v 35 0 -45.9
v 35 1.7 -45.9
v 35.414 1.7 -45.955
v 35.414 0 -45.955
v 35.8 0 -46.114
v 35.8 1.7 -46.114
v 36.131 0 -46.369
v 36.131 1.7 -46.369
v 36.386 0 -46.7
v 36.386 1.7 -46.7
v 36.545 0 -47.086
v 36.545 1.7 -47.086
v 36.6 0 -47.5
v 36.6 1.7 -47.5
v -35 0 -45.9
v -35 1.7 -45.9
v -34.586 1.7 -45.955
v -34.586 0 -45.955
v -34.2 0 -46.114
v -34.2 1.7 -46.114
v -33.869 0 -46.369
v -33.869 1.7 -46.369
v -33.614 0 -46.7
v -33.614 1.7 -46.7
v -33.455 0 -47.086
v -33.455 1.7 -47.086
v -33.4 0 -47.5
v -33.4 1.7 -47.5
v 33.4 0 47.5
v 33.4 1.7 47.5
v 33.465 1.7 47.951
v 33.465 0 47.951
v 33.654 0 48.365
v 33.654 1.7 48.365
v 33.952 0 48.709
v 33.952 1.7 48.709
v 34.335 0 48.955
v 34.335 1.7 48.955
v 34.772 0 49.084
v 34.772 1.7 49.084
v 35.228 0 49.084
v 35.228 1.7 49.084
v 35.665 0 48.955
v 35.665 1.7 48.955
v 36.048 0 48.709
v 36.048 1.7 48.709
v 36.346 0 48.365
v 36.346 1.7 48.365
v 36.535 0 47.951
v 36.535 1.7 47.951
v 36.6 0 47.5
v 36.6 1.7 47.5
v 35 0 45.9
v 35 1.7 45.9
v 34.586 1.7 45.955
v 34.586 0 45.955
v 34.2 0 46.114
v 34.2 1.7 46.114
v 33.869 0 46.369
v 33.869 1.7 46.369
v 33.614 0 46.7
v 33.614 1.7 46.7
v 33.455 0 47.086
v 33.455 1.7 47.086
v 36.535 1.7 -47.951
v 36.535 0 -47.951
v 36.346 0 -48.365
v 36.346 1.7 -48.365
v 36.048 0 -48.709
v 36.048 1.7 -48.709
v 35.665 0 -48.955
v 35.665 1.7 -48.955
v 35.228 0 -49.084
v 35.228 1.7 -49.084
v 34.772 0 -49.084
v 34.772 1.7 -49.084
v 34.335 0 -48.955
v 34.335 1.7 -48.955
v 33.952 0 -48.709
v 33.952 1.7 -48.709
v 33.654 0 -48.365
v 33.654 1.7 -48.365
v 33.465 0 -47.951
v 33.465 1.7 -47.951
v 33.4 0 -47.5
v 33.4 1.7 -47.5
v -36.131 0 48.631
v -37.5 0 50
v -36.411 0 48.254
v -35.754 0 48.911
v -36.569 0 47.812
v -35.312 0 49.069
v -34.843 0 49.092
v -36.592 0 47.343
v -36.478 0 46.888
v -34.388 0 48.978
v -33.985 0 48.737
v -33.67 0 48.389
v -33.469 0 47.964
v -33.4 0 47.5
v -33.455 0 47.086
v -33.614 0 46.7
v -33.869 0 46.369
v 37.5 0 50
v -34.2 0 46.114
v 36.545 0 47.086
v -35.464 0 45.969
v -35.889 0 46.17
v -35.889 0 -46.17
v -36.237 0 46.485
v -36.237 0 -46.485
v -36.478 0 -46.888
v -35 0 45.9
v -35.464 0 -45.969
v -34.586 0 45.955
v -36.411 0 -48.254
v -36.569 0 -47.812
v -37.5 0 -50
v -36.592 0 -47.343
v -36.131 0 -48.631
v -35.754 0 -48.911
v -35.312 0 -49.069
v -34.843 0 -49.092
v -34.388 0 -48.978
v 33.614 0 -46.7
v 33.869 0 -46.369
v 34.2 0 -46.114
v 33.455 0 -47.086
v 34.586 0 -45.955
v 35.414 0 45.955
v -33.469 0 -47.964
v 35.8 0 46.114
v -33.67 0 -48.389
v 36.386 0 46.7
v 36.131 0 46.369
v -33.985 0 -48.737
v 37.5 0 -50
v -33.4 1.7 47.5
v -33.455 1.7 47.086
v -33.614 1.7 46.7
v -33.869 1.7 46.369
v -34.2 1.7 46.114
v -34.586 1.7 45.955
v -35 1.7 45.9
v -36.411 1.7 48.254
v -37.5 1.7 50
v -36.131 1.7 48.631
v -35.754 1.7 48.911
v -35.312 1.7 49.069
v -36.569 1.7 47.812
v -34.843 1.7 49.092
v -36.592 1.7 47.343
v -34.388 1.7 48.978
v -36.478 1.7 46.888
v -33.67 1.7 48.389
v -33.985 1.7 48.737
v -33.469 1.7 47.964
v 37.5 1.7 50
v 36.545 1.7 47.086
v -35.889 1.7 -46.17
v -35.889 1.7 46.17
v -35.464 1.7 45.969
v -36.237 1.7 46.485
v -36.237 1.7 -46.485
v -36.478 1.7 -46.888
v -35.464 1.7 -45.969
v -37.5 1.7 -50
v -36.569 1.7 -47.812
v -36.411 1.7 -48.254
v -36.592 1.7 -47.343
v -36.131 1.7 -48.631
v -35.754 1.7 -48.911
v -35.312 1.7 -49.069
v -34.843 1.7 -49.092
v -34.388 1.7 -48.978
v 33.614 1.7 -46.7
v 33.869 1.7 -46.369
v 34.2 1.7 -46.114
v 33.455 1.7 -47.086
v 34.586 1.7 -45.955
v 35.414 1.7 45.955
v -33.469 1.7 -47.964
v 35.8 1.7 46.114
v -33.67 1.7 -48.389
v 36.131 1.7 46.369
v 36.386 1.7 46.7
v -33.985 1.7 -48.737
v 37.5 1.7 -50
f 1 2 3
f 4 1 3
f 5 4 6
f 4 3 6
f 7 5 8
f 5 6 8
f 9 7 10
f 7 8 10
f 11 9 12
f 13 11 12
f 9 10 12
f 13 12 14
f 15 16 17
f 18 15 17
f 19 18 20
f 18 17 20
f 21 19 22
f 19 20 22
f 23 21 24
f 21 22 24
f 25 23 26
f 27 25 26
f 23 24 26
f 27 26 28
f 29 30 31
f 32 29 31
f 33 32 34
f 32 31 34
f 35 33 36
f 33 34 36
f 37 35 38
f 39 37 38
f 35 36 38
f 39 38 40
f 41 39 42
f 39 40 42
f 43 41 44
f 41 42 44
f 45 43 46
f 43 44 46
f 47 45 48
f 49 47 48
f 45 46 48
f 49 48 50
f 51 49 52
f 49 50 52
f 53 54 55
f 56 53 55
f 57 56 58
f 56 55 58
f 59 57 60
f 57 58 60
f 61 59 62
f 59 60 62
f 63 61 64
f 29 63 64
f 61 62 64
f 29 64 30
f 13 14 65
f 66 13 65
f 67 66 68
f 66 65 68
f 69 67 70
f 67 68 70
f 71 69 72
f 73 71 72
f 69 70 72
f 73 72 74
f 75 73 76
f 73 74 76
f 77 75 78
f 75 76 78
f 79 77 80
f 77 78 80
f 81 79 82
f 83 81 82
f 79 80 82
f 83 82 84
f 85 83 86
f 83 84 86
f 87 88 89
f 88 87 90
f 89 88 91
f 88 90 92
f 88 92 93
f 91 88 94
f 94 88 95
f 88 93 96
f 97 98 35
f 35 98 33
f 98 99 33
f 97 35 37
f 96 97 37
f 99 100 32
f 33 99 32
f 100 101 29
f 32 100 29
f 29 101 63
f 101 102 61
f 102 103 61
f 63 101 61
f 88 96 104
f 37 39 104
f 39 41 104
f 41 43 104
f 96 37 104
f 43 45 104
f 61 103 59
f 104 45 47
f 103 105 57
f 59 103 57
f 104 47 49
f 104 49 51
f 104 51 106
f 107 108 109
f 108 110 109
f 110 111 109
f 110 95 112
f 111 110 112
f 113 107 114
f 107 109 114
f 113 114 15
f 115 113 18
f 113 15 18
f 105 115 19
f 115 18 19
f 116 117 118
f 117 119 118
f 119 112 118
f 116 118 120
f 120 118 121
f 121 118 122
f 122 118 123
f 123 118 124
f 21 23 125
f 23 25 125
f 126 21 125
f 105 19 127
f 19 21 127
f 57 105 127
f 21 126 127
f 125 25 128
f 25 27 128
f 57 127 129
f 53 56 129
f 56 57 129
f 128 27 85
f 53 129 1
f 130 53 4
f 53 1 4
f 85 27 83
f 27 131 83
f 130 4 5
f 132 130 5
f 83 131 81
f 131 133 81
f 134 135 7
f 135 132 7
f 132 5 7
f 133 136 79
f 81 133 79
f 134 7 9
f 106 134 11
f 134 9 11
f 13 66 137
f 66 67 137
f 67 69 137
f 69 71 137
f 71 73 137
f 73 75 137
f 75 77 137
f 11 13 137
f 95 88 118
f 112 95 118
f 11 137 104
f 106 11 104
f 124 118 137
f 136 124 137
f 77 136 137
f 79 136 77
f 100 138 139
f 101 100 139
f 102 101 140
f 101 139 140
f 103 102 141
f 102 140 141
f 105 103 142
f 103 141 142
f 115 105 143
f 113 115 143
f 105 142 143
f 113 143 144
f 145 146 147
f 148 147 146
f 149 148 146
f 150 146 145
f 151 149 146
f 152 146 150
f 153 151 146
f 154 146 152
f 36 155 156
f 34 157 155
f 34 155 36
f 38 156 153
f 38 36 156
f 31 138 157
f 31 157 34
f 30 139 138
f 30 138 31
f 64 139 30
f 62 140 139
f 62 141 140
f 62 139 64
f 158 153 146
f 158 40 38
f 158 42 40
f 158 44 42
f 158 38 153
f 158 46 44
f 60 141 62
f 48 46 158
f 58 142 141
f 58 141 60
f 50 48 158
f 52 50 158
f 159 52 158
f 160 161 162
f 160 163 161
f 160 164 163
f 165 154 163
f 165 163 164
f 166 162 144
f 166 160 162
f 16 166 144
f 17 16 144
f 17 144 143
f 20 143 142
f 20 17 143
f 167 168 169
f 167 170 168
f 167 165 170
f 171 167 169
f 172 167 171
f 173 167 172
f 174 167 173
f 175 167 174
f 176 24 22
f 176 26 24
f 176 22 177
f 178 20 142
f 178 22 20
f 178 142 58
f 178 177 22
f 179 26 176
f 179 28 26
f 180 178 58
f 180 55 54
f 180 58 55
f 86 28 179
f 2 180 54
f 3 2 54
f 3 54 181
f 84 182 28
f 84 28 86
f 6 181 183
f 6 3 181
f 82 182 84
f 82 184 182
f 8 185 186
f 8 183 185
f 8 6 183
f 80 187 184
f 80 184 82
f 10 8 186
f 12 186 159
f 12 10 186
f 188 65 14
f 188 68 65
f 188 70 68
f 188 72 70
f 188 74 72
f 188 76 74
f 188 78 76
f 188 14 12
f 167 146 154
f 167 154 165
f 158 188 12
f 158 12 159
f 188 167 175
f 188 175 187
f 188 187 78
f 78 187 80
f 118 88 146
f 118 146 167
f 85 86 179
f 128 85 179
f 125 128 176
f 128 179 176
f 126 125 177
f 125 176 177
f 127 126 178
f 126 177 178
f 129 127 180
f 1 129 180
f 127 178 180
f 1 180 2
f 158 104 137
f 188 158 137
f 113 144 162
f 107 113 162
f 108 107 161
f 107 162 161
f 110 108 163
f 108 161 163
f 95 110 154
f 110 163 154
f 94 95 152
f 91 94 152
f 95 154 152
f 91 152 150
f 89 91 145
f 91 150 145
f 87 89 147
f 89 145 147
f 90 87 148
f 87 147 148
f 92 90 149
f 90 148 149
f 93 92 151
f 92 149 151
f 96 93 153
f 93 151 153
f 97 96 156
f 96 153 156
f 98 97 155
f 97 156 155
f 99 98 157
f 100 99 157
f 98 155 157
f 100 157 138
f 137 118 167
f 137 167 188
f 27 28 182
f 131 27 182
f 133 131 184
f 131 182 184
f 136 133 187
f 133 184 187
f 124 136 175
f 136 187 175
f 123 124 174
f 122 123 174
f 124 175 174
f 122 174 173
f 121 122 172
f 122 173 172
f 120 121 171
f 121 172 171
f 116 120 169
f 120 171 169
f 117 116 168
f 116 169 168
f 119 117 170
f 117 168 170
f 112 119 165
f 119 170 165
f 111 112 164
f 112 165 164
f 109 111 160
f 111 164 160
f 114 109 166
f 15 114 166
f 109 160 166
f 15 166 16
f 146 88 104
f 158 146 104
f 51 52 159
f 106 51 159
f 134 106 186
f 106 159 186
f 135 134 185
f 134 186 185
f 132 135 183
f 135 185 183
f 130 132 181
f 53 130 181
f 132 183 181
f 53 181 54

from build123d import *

# Parameters (mm, degrees)
SKETCH1_W           = 75
SKETCH1_H           = 100
BOSS_EXTRUDE1_DEPTH = 1.7
CUT_EXTRUDE1_REACH  = 64.523


with BuildPart() as part:
    # Sketch1 → Boss-Extrude1 (new body)
    with BuildSketch(Plane(origin=(0, 0, 0), x_dir=(1, 0, 0), z_dir=(0, 1, 0))):
        Rectangle(SKETCH1_W, SKETCH1_H)
    extrude(amount=BOSS_EXTRUDE1_DEPTH)

    # Sketch2 → Cut-Extrude1 (cut, up to next)
    with BuildSketch(Plane(origin=(0, 1.7, 0), x_dir=(1, 0, 0), z_dir=(0, 1, 0)), mode=Mode.PRIVATE) as cut_extrude1_sk1:
        with BuildLine():
            ThreePointArc((-33.4, 47.5), (-36.13137085, 48.63137085), (-35, 45.9))
            Line((-35, 45.9), (-35, 47.5))
            Line((-35, 47.5), (-33.4, 47.5))
        make_face()
    cut_extrude1_tool1 = extrude(cut_extrude1_sk1.sketch, amount=-CUT_EXTRUDE1_REACH, mode=Mode.PRIVATE) & part.part
    # Sketch2 → Cut-Extrude1 (cut, up to next)
    with BuildSketch(Plane(origin=(0, 1.7, 0), x_dir=(1, 0, 0), z_dir=(0, 1, 0)), mode=Mode.PRIVATE) as cut_extrude1_sk2:
        with BuildLine():
            Line((-35, 47.5), (-35, 45.9))
            ThreePointArc((-35, 45.9), (-33.86862915, 46.36862915), (-33.4, 47.5))
            Line((-33.4, 47.5), (-35, 47.5))
        make_face()
    cut_extrude1_tool2 = extrude(cut_extrude1_sk2.sketch, amount=-CUT_EXTRUDE1_REACH, mode=Mode.PRIVATE) & part.part
    # Sketch2 → Cut-Extrude1 (cut, up to next)
    with BuildSketch(Plane(origin=(0, 1.7, 0), x_dir=(1, 0, 0), z_dir=(0, 1, 0)), mode=Mode.PRIVATE) as cut_extrude1_sk3:
        with BuildLine():
            ThreePointArc((-33.4, 47.5), (-36.13137085, 48.63137085), (-35, 45.9))
            Line((-35, 45.9), (-35, 47.5))
            Line((-35, 47.5), (-33.4, 47.5))
        make_face()
    cut_extrude1_tool3 = extrude(cut_extrude1_sk3.sketch, amount=-CUT_EXTRUDE1_REACH, mode=Mode.PRIVATE) & part.part
    # Sketch2 → Cut-Extrude1 (cut, up to next)
    with BuildSketch(Plane(origin=(0, 1.7, 0), x_dir=(1, 0, 0), z_dir=(0, 1, 0)), mode=Mode.PRIVATE) as cut_extrude1_sk4:
        with BuildLine():
            Line((-35, 47.5), (-35, 45.9))
            ThreePointArc((-35, 45.9), (-33.86862915, 46.36862915), (-33.4, 47.5))
            Line((-33.4, 47.5), (-35, 47.5))
        make_face()
    cut_extrude1_tool4 = extrude(cut_extrude1_sk4.sketch, amount=-CUT_EXTRUDE1_REACH, mode=Mode.PRIVATE) & part.part
    # Sketch2 → Cut-Extrude1 (cut, up to next)
    with BuildSketch(Plane(origin=(0, 1.7, 0), x_dir=(1, 0, 0), z_dir=(0, 1, 0)), mode=Mode.PRIVATE) as cut_extrude1_sk5:
        with BuildLine():
            ThreePointArc((33.4, 47.5), (33.86862915, 46.36862915), (35, 45.9))
            Line((35, 45.9), (35, 47.5))
            Line((35, 47.5), (33.4, 47.5))
        make_face()
    cut_extrude1_tool5 = extrude(cut_extrude1_sk5.sketch, amount=-CUT_EXTRUDE1_REACH, mode=Mode.PRIVATE) & part.part
    # Sketch2 → Cut-Extrude1 (cut, up to next)
    with BuildSketch(Plane(origin=(0, 1.7, 0), x_dir=(1, 0, 0), z_dir=(0, 1, 0)), mode=Mode.PRIVATE) as cut_extrude1_sk6:
        with BuildLine():
            Line((35, 47.5), (35, 45.9))
            ThreePointArc((35, 45.9), (36.13137085, 46.36862915), (36.6, 47.5))
            ThreePointArc((36.6, 47.5), (35, 49.1), (33.4, 47.5))
            Line((33.4, 47.5), (35, 47.5))
        make_face()
    cut_extrude1_tool6 = extrude(cut_extrude1_sk6.sketch, amount=-CUT_EXTRUDE1_REACH, mode=Mode.PRIVATE) & part.part
    # Sketch2 → Cut-Extrude1 (cut, up to next)
    with BuildSketch(Plane(origin=(0, 1.7, 0), x_dir=(1, 0, 0), z_dir=(0, 1, 0)), mode=Mode.PRIVATE) as cut_extrude1_sk7:
        with BuildLine():
            ThreePointArc((33.4, 47.5), (33.86862915, 46.36862915), (35, 45.9))
            Line((35, 45.9), (35, 47.5))
            Line((35, 47.5), (33.4, 47.5))
        make_face()
    cut_extrude1_tool7 = extrude(cut_extrude1_sk7.sketch, amount=-CUT_EXTRUDE1_REACH, mode=Mode.PRIVATE) & part.part
    # Sketch2 → Cut-Extrude1 (cut, up to next)
    with BuildSketch(Plane(origin=(0, 1.7, 0), x_dir=(1, 0, 0), z_dir=(0, 1, 0)), mode=Mode.PRIVATE) as cut_extrude1_sk8:
        with BuildLine():
            Line((35, 47.5), (35, 45.9))
            ThreePointArc((35, 45.9), (36.13137085, 46.36862915), (36.6, 47.5))
            ThreePointArc((36.6, 47.5), (35, 49.1), (33.4, 47.5))
            Line((33.4, 47.5), (35, 47.5))
        make_face()
    cut_extrude1_tool8 = extrude(cut_extrude1_sk8.sketch, amount=-CUT_EXTRUDE1_REACH, mode=Mode.PRIVATE) & part.part
    # Sketch2 → Cut-Extrude1 (cut, up to next)
    with BuildSketch(Plane(origin=(0, 1.7, 0), x_dir=(1, 0, 0), z_dir=(0, 1, 0)), mode=Mode.PRIVATE) as cut_extrude1_sk9:
        with BuildLine():
            Line((-35, -45.9), (-35, -47.5))
            Line((-35, -47.5), (-33.4, -47.5))
            ThreePointArc((-33.4, -47.5), (-33.86862915, -46.36862915), (-35, -45.9))
        make_face()
    cut_extrude1_tool9 = extrude(cut_extrude1_sk9.sketch, amount=-CUT_EXTRUDE1_REACH, mode=Mode.PRIVATE) & part.part
    # Sketch2 → Cut-Extrude1 (cut, up to next)
    with BuildSketch(Plane(origin=(0, 1.7, 0), x_dir=(1, 0, 0), z_dir=(0, 1, 0)), mode=Mode.PRIVATE) as cut_extrude1_sk10:
        with BuildLine():
            Line((-33.4, -47.5), (-35, -47.5))
            Line((-35, -47.5), (-35, -45.9))
            ThreePointArc((-35, -45.9), (-36.13137085, -48.63137085), (-33.4, -47.5))
        make_face()
    cut_extrude1_tool10 = extrude(cut_extrude1_sk10.sketch, amount=-CUT_EXTRUDE1_REACH, mode=Mode.PRIVATE) & part.part
    # Sketch2 → Cut-Extrude1 (cut, up to next)
    with BuildSketch(Plane(origin=(0, 1.7, 0), x_dir=(1, 0, 0), z_dir=(0, 1, 0)), mode=Mode.PRIVATE) as cut_extrude1_sk11:
        with BuildLine():
            Line((-35, -45.9), (-35, -47.5))
            Line((-35, -47.5), (-33.4, -47.5))
            ThreePointArc((-33.4, -47.5), (-33.86862915, -46.36862915), (-35, -45.9))
        make_face()
    cut_extrude1_tool11 = extrude(cut_extrude1_sk11.sketch, amount=-CUT_EXTRUDE1_REACH, mode=Mode.PRIVATE) & part.part
    # Sketch2 → Cut-Extrude1 (cut, up to next)
    with BuildSketch(Plane(origin=(0, 1.7, 0), x_dir=(1, 0, 0), z_dir=(0, 1, 0)), mode=Mode.PRIVATE) as cut_extrude1_sk12:
        with BuildLine():
            Line((-33.4, -47.5), (-35, -47.5))
            Line((-35, -47.5), (-35, -45.9))
            ThreePointArc((-35, -45.9), (-36.13137085, -48.63137085), (-33.4, -47.5))
        make_face()
    cut_extrude1_tool12 = extrude(cut_extrude1_sk12.sketch, amount=-CUT_EXTRUDE1_REACH, mode=Mode.PRIVATE) & part.part
    # Sketch2 → Cut-Extrude1 (cut, up to next)
    with BuildSketch(Plane(origin=(0, 1.7, 0), x_dir=(1, 0, 0), z_dir=(0, 1, 0)), mode=Mode.PRIVATE) as cut_extrude1_sk13:
        with BuildLine():
            ThreePointArc((35, -45.9), (33.86862915, -46.36862915), (33.4, -47.5))
            Line((33.4, -47.5), (35, -47.5))
            Line((35, -47.5), (35, -45.9))
        make_face()
    cut_extrude1_tool13 = extrude(cut_extrude1_sk13.sketch, amount=-CUT_EXTRUDE1_REACH, mode=Mode.PRIVATE) & part.part
    # Sketch2 → Cut-Extrude1 (cut, up to next)
    with BuildSketch(Plane(origin=(0, 1.7, 0), x_dir=(1, 0, 0), z_dir=(0, 1, 0)), mode=Mode.PRIVATE) as cut_extrude1_sk14:
        with BuildLine():
            Line((35, -47.5), (33.4, -47.5))
            ThreePointArc((33.4, -47.5), (35, -49.1), (36.6, -47.5))
            ThreePointArc((36.6, -47.5), (36.13137085, -46.36862915), (35, -45.9))
            Line((35, -45.9), (35, -47.5))
        make_face()
    cut_extrude1_tool14 = extrude(cut_extrude1_sk14.sketch, amount=-CUT_EXTRUDE1_REACH, mode=Mode.PRIVATE) & part.part
    # Sketch2 → Cut-Extrude1 (cut, up to next)
    with BuildSketch(Plane(origin=(0, 1.7, 0), x_dir=(1, 0, 0), z_dir=(0, 1, 0)), mode=Mode.PRIVATE) as cut_extrude1_sk15:
        with BuildLine():
            ThreePointArc((35, -45.9), (33.86862915, -46.36862915), (33.4, -47.5))
            Line((33.4, -47.5), (35, -47.5))
            Line((35, -47.5), (35, -45.9))
        make_face()
    cut_extrude1_tool15 = extrude(cut_extrude1_sk15.sketch, amount=-CUT_EXTRUDE1_REACH, mode=Mode.PRIVATE) & part.part
    # Sketch2 → Cut-Extrude1 (cut, up to next)
    with BuildSketch(Plane(origin=(0, 1.7, 0), x_dir=(1, 0, 0), z_dir=(0, 1, 0)), mode=Mode.PRIVATE) as cut_extrude1_sk16:
        with BuildLine():
            Line((35, -47.5), (33.4, -47.5))
            ThreePointArc((33.4, -47.5), (35, -49.1), (36.6, -47.5))
            ThreePointArc((36.6, -47.5), (36.13137085, -46.36862915), (35, -45.9))
            Line((35, -45.9), (35, -47.5))
        make_face()
    cut_extrude1_tool16 = extrude(cut_extrude1_sk16.sketch, amount=-CUT_EXTRUDE1_REACH, mode=Mode.PRIVATE) & part.part
    add(cut_extrude1_tool1.solids().sort_by_distance((-35.226354, 1.7, -47.726354))[0], mode=Mode.SUBTRACT)
    add(cut_extrude1_tool2.solids().sort_by_distance((-34.320939, 1.7, -46.820939))[0], mode=Mode.SUBTRACT)
    add(cut_extrude1_tool3.solids().sort_by_distance((-35.226354, 1.7, -47.726354))[0], mode=Mode.SUBTRACT)
    add(cut_extrude1_tool4.solids().sort_by_distance((-34.320939, 1.7, -46.820939))[0], mode=Mode.SUBTRACT)
    add(cut_extrude1_tool5.solids().sort_by_distance((34.320939, 1.7, -46.820939))[0], mode=Mode.SUBTRACT)
    add(cut_extrude1_tool6.solids().sort_by_distance((35.226354, 1.7, -47.726354))[0], mode=Mode.SUBTRACT)
    add(cut_extrude1_tool7.solids().sort_by_distance((34.320939, 1.7, -46.820939))[0], mode=Mode.SUBTRACT)
    add(cut_extrude1_tool8.solids().sort_by_distance((35.226354, 1.7, -47.726354))[0], mode=Mode.SUBTRACT)
    add(cut_extrude1_tool9.solids().sort_by_distance((-34.320939, 1.7, 46.820939))[0], mode=Mode.SUBTRACT)
    add(cut_extrude1_tool10.solids().sort_by_distance((-35.226354, 1.7, 47.726354))[0], mode=Mode.SUBTRACT)
    add(cut_extrude1_tool11.solids().sort_by_distance((-34.320939, 1.7, 46.820939))[0], mode=Mode.SUBTRACT)
    add(cut_extrude1_tool12.solids().sort_by_distance((-35.226354, 1.7, 47.726354))[0], mode=Mode.SUBTRACT)
    add(cut_extrude1_tool13.solids().sort_by_distance((34.320939, 1.7, 46.820939))[0], mode=Mode.SUBTRACT)
    add(cut_extrude1_tool14.solids().sort_by_distance((35.226354, 1.7, 47.726354))[0], mode=Mode.SUBTRACT)
    add(cut_extrude1_tool15.solids().sort_by_distance((34.320939, 1.7, 46.820939))[0], mode=Mode.SUBTRACT)
    add(cut_extrude1_tool16.solids().sort_by_distance((35.226354, 1.7, 47.726354))[0], mode=Mode.SUBTRACT)


solid = part.part
